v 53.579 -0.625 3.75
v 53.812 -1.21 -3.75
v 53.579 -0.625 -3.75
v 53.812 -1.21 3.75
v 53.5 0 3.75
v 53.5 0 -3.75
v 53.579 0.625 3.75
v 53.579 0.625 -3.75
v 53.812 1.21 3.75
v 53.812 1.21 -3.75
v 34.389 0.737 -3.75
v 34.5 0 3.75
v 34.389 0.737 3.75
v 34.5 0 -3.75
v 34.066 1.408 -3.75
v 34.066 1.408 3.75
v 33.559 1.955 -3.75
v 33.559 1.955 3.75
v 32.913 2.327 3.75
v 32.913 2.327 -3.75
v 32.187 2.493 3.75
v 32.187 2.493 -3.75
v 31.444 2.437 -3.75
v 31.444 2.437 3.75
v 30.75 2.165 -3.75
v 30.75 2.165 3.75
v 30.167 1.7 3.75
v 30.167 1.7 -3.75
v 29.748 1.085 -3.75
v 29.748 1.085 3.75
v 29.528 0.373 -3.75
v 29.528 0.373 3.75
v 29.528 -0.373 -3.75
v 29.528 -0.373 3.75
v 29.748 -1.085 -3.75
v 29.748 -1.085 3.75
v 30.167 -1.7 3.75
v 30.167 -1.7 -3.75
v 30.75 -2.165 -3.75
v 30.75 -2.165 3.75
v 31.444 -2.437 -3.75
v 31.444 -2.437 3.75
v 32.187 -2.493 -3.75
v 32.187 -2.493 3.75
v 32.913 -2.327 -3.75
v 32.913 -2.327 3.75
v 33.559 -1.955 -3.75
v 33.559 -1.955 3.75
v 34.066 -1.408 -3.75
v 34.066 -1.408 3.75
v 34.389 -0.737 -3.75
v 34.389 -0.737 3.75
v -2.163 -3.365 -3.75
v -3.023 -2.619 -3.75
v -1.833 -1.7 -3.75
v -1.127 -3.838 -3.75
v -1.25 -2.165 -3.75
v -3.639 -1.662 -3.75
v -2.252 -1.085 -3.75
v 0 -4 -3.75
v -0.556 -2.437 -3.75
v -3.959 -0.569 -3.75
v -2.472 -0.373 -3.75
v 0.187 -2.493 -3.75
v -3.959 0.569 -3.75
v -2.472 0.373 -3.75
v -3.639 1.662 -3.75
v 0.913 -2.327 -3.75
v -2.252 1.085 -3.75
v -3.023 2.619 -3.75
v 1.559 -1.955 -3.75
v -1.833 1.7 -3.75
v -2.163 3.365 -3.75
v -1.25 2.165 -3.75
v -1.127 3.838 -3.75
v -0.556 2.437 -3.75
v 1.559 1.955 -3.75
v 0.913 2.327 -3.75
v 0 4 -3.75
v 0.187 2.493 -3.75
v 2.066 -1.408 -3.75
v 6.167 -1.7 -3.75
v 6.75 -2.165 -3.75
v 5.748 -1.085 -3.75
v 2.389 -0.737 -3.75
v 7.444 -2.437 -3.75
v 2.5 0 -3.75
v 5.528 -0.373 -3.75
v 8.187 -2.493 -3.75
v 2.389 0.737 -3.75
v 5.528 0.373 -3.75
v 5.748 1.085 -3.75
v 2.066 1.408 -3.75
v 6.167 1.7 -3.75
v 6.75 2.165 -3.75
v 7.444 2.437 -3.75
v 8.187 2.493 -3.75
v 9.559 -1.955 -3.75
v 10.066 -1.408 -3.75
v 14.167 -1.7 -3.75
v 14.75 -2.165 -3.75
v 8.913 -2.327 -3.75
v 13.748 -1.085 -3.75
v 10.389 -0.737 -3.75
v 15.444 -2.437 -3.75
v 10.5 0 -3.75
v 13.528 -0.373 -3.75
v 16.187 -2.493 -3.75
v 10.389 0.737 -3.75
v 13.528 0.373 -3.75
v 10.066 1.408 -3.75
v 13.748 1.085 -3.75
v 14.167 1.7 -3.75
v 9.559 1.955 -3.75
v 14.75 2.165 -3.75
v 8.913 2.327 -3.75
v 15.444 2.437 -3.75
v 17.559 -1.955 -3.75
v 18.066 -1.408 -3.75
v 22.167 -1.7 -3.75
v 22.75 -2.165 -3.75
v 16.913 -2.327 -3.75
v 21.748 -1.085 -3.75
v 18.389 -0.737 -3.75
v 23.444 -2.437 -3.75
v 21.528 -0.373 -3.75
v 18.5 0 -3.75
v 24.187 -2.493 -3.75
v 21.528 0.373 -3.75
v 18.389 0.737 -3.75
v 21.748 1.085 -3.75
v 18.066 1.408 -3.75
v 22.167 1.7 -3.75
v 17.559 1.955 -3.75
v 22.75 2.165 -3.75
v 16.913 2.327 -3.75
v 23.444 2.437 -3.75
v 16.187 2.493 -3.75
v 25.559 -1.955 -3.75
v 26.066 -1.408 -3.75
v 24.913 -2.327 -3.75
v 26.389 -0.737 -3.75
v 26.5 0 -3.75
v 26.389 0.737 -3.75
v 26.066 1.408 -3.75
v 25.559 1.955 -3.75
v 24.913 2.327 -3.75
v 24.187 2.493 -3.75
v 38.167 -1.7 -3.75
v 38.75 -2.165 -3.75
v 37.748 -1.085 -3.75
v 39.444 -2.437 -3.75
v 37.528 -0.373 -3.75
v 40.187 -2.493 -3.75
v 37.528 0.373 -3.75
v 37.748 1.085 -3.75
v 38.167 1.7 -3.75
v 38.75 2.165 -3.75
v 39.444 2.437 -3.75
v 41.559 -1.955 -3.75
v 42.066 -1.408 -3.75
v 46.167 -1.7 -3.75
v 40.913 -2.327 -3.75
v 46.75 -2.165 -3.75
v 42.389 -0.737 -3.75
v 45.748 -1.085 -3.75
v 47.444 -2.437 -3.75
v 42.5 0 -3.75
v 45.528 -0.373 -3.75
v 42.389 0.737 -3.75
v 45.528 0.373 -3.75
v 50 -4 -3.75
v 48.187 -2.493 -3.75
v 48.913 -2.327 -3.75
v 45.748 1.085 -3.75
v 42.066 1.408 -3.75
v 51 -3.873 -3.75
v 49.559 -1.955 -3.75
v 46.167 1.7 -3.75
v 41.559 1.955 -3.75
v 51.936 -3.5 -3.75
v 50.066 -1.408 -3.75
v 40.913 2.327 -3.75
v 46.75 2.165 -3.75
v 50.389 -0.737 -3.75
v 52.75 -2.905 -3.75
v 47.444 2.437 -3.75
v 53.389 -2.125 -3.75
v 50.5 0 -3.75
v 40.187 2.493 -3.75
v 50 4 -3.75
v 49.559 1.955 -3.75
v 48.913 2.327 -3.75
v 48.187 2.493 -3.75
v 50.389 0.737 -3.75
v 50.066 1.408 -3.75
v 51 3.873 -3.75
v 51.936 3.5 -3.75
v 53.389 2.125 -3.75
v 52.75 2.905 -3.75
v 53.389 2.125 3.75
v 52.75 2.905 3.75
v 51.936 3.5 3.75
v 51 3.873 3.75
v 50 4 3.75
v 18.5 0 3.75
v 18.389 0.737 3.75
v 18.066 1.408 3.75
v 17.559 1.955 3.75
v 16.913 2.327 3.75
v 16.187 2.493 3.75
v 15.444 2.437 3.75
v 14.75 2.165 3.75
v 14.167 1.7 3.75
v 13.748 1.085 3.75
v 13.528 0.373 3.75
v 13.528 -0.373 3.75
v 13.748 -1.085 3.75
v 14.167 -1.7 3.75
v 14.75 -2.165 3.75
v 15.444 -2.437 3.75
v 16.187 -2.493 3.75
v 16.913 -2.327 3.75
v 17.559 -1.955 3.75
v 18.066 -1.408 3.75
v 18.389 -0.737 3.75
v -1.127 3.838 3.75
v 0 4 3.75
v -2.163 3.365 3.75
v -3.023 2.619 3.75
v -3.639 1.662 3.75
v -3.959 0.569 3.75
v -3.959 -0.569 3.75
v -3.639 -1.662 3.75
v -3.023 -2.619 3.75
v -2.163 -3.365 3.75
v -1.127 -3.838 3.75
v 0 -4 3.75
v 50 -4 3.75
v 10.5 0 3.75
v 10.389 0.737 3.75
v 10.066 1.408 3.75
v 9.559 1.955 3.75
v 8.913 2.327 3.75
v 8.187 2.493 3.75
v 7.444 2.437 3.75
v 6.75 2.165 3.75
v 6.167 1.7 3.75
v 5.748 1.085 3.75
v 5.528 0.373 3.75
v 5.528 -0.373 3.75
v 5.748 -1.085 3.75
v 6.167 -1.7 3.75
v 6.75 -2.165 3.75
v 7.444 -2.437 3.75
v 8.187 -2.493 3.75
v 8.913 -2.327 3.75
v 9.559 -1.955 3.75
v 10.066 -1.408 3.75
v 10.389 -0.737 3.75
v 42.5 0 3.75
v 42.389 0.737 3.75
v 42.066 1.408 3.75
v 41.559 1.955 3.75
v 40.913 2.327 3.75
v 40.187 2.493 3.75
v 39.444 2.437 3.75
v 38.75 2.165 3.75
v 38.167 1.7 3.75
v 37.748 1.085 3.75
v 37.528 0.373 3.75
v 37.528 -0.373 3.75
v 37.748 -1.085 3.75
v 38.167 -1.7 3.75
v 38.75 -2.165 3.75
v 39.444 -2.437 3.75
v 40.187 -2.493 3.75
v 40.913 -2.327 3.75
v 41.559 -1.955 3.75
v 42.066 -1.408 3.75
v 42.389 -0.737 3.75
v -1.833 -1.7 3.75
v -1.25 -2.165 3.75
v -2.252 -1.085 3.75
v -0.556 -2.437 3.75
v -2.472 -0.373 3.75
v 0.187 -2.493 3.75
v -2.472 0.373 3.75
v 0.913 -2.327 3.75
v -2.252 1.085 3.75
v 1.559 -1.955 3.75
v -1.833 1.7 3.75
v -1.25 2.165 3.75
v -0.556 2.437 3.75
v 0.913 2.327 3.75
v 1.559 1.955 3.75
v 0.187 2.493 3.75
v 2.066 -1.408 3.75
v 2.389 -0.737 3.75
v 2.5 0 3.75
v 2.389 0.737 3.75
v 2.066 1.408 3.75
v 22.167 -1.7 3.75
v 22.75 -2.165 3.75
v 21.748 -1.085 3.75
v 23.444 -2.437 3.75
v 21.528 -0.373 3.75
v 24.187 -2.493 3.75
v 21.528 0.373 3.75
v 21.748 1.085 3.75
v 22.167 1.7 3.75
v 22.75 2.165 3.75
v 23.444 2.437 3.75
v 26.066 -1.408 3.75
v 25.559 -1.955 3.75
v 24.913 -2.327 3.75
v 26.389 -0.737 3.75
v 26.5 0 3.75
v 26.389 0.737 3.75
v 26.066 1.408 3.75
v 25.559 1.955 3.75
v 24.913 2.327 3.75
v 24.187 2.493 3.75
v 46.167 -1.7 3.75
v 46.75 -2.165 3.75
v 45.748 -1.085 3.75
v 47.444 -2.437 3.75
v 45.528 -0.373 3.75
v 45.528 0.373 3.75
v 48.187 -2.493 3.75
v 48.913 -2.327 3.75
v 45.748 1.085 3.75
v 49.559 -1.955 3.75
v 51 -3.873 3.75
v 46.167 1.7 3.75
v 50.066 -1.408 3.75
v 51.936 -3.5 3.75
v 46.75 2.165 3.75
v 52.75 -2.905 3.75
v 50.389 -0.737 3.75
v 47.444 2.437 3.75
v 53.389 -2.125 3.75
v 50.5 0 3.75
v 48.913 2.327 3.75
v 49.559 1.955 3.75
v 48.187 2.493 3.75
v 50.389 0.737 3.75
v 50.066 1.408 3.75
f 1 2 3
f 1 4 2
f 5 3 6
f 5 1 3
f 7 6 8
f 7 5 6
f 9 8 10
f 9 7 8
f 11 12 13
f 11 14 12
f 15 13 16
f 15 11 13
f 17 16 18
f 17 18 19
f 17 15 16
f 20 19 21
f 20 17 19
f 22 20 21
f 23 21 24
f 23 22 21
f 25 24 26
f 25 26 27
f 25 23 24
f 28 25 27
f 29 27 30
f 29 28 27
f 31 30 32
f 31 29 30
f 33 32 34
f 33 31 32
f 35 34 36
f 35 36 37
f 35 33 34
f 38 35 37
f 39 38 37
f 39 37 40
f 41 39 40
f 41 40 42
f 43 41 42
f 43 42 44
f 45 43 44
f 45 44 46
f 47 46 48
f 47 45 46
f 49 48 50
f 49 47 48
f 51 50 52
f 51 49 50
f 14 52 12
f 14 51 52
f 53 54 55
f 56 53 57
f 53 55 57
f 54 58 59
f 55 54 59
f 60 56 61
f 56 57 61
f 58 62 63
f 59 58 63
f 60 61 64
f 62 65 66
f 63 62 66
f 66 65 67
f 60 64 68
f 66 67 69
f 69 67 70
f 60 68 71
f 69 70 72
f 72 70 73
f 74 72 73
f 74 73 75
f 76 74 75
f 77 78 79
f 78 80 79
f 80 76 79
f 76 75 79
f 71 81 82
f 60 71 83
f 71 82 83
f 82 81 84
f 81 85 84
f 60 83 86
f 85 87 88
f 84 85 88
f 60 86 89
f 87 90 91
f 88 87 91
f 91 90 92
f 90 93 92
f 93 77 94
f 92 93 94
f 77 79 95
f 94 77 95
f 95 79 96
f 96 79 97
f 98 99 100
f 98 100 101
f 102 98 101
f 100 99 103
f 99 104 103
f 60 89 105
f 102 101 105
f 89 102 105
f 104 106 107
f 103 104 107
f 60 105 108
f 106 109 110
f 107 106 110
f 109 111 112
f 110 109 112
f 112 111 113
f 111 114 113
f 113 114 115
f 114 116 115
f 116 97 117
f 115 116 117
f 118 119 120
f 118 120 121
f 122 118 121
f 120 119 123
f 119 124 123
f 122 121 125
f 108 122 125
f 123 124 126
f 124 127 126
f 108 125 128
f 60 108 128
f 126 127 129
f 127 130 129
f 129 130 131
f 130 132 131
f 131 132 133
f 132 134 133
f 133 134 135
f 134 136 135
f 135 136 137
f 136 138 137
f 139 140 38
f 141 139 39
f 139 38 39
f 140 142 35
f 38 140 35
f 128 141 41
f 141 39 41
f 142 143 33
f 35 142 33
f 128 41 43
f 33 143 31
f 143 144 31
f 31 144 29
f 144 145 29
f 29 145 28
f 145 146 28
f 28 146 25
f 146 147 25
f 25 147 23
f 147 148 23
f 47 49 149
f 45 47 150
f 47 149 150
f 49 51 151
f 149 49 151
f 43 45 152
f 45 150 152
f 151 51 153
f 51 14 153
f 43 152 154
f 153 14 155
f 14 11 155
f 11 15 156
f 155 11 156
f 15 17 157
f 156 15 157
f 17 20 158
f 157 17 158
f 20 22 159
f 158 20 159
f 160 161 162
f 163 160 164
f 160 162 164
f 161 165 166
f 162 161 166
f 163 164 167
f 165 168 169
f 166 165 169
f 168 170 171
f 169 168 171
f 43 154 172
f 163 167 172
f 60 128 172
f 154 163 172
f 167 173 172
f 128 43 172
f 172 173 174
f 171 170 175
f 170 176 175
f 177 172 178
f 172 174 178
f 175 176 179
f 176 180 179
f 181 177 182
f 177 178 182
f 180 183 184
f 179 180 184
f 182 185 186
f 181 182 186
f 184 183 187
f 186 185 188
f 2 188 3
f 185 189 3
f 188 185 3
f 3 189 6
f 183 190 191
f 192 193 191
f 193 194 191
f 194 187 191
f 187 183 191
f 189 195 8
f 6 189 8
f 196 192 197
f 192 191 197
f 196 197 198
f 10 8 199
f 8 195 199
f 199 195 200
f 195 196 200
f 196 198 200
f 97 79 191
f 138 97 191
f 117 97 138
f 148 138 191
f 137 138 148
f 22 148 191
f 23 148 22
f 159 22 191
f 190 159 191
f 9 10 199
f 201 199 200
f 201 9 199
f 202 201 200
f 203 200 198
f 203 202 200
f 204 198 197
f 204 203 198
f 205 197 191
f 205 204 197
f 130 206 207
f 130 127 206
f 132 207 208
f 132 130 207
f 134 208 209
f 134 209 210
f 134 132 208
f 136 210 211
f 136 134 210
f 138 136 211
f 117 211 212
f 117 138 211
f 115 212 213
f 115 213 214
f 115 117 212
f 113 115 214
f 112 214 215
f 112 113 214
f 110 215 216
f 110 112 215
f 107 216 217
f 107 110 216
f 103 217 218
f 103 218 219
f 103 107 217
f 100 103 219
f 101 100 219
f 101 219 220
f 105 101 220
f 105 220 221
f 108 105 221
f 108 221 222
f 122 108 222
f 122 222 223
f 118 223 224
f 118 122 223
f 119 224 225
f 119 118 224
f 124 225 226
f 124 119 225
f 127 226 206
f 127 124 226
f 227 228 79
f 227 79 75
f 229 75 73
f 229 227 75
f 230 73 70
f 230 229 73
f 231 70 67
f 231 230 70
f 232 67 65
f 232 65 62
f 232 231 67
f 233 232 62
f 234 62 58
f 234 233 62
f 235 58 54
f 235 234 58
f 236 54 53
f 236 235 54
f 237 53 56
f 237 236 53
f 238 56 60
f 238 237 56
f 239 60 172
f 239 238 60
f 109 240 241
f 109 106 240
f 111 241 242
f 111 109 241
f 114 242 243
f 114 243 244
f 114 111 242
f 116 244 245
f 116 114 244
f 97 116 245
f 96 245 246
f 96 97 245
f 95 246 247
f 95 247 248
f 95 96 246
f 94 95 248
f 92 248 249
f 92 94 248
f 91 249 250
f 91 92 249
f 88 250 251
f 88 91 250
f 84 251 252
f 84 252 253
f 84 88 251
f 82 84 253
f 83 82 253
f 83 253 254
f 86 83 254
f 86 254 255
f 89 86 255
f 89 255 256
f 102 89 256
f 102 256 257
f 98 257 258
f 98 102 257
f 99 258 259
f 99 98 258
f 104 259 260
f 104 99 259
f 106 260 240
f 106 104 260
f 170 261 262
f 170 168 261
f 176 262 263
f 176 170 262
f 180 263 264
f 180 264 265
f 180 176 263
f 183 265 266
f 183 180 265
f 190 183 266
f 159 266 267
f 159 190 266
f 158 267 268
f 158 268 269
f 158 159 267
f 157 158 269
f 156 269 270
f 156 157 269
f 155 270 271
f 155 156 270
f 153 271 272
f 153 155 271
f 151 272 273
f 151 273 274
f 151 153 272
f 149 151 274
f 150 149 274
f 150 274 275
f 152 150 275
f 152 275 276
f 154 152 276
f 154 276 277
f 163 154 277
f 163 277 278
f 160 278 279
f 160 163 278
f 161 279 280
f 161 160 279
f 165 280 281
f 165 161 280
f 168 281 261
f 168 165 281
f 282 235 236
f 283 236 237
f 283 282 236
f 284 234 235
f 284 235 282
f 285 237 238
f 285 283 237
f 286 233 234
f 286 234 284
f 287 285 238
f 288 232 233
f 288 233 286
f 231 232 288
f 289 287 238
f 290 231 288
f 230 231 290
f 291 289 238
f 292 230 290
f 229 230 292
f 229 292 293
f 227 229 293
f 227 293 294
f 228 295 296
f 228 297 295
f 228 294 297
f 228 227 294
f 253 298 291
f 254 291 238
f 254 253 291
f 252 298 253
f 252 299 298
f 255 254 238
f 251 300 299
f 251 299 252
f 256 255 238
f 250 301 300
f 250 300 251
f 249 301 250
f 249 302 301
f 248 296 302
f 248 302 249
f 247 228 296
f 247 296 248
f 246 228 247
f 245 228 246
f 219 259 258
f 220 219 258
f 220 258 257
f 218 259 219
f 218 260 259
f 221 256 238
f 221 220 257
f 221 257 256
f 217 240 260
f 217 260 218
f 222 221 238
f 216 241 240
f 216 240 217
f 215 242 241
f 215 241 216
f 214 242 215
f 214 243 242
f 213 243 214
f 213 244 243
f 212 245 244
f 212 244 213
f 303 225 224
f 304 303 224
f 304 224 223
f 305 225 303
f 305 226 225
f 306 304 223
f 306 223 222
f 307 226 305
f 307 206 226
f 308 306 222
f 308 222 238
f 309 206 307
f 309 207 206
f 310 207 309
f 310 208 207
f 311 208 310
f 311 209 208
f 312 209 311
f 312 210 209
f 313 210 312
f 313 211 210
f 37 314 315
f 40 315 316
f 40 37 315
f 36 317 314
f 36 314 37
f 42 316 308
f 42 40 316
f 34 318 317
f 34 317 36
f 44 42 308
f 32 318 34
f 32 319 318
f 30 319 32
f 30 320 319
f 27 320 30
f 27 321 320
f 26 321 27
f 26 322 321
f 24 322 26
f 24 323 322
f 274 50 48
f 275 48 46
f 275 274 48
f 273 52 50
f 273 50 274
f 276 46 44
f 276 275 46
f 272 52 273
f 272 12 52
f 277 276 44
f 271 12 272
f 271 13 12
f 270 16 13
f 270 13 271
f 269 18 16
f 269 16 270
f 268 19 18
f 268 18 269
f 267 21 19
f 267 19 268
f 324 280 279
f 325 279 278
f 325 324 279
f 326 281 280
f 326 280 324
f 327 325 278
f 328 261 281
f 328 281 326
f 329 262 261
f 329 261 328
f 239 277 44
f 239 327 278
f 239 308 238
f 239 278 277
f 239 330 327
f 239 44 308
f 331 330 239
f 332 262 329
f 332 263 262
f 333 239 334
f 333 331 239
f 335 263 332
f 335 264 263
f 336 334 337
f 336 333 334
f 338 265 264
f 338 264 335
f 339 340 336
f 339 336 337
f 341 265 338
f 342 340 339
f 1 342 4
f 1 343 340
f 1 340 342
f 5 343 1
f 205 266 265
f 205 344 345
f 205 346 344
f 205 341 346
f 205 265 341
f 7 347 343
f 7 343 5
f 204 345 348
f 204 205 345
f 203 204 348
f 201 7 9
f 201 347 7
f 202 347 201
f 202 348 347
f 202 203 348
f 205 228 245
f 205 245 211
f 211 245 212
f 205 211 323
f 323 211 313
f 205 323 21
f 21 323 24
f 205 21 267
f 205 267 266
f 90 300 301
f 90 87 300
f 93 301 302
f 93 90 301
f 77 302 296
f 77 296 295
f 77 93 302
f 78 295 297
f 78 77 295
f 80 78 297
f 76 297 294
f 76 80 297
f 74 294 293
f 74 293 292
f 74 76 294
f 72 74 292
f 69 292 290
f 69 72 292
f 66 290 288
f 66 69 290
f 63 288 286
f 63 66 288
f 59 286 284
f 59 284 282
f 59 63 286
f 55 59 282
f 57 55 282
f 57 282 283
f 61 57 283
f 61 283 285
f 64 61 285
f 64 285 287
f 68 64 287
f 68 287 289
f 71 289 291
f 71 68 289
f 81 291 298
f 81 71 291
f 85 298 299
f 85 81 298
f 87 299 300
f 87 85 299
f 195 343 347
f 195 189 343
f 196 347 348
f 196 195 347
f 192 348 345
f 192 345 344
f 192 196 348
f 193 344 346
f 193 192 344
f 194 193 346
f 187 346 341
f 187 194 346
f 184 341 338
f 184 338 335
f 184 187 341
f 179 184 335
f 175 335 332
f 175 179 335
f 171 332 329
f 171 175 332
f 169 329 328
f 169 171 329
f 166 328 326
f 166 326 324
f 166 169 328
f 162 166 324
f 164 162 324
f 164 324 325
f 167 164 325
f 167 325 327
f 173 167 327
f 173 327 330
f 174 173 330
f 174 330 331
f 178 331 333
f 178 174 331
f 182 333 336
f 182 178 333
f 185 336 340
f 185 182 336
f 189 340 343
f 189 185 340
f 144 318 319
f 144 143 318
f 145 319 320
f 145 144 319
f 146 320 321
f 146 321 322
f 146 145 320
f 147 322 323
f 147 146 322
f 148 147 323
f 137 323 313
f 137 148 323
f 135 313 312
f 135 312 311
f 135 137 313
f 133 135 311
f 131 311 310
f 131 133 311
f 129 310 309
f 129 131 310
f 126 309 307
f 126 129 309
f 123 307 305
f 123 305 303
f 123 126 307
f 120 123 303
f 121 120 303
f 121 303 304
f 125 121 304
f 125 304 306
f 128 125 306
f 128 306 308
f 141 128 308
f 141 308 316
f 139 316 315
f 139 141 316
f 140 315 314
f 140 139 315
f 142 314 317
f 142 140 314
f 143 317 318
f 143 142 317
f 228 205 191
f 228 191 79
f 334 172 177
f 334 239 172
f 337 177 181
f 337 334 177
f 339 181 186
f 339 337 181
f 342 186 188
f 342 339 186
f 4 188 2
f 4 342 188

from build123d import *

# Parameters (mm, degrees)
F0_R     = 2.5
F1_DEPTH = 3.75


with BuildPart() as f1:
    # F0 (on Top) → F1 (new body, symmetric)
    with BuildSketch(Plane.XY):
        with BuildLine():
            ThreePointArc((53.8125, -1.210307), (53.5, 0), (53.8125, 1.210307))
            ThreePointArc((53.8125, 1.210307), (52.362072, 3.228098), (50, 4))
            Line((50, 4), (0, 4))
            ThreePointArc((0, 4), (-4, 0), (0, -4))
            Line((0, -4), (50, -4))
            ThreePointArc((50, -4), (52.362072, -3.228098), (53.8125, -1.210307))
        make_face()
        Circle(F0_R, mode=Mode.SUBTRACT)
        with Locations((8, 0)):
            Circle(F0_R, mode=Mode.SUBTRACT)
        with Locations((16, 0)):
            Circle(F0_R, mode=Mode.SUBTRACT)
        with Locations((24, 0)):
            Circle(F0_R, mode=Mode.SUBTRACT)
        with Locations((32, 0)):
            Circle(F0_R, mode=Mode.SUBTRACT)
        with Locations((40, 0)):
            Circle(F0_R, mode=Mode.SUBTRACT)
        with Locations((48, 0)):
            Circle(F0_R, mode=Mode.SUBTRACT)
    extrude(amount=F1_DEPTH, both=True)


solid = f1.part
